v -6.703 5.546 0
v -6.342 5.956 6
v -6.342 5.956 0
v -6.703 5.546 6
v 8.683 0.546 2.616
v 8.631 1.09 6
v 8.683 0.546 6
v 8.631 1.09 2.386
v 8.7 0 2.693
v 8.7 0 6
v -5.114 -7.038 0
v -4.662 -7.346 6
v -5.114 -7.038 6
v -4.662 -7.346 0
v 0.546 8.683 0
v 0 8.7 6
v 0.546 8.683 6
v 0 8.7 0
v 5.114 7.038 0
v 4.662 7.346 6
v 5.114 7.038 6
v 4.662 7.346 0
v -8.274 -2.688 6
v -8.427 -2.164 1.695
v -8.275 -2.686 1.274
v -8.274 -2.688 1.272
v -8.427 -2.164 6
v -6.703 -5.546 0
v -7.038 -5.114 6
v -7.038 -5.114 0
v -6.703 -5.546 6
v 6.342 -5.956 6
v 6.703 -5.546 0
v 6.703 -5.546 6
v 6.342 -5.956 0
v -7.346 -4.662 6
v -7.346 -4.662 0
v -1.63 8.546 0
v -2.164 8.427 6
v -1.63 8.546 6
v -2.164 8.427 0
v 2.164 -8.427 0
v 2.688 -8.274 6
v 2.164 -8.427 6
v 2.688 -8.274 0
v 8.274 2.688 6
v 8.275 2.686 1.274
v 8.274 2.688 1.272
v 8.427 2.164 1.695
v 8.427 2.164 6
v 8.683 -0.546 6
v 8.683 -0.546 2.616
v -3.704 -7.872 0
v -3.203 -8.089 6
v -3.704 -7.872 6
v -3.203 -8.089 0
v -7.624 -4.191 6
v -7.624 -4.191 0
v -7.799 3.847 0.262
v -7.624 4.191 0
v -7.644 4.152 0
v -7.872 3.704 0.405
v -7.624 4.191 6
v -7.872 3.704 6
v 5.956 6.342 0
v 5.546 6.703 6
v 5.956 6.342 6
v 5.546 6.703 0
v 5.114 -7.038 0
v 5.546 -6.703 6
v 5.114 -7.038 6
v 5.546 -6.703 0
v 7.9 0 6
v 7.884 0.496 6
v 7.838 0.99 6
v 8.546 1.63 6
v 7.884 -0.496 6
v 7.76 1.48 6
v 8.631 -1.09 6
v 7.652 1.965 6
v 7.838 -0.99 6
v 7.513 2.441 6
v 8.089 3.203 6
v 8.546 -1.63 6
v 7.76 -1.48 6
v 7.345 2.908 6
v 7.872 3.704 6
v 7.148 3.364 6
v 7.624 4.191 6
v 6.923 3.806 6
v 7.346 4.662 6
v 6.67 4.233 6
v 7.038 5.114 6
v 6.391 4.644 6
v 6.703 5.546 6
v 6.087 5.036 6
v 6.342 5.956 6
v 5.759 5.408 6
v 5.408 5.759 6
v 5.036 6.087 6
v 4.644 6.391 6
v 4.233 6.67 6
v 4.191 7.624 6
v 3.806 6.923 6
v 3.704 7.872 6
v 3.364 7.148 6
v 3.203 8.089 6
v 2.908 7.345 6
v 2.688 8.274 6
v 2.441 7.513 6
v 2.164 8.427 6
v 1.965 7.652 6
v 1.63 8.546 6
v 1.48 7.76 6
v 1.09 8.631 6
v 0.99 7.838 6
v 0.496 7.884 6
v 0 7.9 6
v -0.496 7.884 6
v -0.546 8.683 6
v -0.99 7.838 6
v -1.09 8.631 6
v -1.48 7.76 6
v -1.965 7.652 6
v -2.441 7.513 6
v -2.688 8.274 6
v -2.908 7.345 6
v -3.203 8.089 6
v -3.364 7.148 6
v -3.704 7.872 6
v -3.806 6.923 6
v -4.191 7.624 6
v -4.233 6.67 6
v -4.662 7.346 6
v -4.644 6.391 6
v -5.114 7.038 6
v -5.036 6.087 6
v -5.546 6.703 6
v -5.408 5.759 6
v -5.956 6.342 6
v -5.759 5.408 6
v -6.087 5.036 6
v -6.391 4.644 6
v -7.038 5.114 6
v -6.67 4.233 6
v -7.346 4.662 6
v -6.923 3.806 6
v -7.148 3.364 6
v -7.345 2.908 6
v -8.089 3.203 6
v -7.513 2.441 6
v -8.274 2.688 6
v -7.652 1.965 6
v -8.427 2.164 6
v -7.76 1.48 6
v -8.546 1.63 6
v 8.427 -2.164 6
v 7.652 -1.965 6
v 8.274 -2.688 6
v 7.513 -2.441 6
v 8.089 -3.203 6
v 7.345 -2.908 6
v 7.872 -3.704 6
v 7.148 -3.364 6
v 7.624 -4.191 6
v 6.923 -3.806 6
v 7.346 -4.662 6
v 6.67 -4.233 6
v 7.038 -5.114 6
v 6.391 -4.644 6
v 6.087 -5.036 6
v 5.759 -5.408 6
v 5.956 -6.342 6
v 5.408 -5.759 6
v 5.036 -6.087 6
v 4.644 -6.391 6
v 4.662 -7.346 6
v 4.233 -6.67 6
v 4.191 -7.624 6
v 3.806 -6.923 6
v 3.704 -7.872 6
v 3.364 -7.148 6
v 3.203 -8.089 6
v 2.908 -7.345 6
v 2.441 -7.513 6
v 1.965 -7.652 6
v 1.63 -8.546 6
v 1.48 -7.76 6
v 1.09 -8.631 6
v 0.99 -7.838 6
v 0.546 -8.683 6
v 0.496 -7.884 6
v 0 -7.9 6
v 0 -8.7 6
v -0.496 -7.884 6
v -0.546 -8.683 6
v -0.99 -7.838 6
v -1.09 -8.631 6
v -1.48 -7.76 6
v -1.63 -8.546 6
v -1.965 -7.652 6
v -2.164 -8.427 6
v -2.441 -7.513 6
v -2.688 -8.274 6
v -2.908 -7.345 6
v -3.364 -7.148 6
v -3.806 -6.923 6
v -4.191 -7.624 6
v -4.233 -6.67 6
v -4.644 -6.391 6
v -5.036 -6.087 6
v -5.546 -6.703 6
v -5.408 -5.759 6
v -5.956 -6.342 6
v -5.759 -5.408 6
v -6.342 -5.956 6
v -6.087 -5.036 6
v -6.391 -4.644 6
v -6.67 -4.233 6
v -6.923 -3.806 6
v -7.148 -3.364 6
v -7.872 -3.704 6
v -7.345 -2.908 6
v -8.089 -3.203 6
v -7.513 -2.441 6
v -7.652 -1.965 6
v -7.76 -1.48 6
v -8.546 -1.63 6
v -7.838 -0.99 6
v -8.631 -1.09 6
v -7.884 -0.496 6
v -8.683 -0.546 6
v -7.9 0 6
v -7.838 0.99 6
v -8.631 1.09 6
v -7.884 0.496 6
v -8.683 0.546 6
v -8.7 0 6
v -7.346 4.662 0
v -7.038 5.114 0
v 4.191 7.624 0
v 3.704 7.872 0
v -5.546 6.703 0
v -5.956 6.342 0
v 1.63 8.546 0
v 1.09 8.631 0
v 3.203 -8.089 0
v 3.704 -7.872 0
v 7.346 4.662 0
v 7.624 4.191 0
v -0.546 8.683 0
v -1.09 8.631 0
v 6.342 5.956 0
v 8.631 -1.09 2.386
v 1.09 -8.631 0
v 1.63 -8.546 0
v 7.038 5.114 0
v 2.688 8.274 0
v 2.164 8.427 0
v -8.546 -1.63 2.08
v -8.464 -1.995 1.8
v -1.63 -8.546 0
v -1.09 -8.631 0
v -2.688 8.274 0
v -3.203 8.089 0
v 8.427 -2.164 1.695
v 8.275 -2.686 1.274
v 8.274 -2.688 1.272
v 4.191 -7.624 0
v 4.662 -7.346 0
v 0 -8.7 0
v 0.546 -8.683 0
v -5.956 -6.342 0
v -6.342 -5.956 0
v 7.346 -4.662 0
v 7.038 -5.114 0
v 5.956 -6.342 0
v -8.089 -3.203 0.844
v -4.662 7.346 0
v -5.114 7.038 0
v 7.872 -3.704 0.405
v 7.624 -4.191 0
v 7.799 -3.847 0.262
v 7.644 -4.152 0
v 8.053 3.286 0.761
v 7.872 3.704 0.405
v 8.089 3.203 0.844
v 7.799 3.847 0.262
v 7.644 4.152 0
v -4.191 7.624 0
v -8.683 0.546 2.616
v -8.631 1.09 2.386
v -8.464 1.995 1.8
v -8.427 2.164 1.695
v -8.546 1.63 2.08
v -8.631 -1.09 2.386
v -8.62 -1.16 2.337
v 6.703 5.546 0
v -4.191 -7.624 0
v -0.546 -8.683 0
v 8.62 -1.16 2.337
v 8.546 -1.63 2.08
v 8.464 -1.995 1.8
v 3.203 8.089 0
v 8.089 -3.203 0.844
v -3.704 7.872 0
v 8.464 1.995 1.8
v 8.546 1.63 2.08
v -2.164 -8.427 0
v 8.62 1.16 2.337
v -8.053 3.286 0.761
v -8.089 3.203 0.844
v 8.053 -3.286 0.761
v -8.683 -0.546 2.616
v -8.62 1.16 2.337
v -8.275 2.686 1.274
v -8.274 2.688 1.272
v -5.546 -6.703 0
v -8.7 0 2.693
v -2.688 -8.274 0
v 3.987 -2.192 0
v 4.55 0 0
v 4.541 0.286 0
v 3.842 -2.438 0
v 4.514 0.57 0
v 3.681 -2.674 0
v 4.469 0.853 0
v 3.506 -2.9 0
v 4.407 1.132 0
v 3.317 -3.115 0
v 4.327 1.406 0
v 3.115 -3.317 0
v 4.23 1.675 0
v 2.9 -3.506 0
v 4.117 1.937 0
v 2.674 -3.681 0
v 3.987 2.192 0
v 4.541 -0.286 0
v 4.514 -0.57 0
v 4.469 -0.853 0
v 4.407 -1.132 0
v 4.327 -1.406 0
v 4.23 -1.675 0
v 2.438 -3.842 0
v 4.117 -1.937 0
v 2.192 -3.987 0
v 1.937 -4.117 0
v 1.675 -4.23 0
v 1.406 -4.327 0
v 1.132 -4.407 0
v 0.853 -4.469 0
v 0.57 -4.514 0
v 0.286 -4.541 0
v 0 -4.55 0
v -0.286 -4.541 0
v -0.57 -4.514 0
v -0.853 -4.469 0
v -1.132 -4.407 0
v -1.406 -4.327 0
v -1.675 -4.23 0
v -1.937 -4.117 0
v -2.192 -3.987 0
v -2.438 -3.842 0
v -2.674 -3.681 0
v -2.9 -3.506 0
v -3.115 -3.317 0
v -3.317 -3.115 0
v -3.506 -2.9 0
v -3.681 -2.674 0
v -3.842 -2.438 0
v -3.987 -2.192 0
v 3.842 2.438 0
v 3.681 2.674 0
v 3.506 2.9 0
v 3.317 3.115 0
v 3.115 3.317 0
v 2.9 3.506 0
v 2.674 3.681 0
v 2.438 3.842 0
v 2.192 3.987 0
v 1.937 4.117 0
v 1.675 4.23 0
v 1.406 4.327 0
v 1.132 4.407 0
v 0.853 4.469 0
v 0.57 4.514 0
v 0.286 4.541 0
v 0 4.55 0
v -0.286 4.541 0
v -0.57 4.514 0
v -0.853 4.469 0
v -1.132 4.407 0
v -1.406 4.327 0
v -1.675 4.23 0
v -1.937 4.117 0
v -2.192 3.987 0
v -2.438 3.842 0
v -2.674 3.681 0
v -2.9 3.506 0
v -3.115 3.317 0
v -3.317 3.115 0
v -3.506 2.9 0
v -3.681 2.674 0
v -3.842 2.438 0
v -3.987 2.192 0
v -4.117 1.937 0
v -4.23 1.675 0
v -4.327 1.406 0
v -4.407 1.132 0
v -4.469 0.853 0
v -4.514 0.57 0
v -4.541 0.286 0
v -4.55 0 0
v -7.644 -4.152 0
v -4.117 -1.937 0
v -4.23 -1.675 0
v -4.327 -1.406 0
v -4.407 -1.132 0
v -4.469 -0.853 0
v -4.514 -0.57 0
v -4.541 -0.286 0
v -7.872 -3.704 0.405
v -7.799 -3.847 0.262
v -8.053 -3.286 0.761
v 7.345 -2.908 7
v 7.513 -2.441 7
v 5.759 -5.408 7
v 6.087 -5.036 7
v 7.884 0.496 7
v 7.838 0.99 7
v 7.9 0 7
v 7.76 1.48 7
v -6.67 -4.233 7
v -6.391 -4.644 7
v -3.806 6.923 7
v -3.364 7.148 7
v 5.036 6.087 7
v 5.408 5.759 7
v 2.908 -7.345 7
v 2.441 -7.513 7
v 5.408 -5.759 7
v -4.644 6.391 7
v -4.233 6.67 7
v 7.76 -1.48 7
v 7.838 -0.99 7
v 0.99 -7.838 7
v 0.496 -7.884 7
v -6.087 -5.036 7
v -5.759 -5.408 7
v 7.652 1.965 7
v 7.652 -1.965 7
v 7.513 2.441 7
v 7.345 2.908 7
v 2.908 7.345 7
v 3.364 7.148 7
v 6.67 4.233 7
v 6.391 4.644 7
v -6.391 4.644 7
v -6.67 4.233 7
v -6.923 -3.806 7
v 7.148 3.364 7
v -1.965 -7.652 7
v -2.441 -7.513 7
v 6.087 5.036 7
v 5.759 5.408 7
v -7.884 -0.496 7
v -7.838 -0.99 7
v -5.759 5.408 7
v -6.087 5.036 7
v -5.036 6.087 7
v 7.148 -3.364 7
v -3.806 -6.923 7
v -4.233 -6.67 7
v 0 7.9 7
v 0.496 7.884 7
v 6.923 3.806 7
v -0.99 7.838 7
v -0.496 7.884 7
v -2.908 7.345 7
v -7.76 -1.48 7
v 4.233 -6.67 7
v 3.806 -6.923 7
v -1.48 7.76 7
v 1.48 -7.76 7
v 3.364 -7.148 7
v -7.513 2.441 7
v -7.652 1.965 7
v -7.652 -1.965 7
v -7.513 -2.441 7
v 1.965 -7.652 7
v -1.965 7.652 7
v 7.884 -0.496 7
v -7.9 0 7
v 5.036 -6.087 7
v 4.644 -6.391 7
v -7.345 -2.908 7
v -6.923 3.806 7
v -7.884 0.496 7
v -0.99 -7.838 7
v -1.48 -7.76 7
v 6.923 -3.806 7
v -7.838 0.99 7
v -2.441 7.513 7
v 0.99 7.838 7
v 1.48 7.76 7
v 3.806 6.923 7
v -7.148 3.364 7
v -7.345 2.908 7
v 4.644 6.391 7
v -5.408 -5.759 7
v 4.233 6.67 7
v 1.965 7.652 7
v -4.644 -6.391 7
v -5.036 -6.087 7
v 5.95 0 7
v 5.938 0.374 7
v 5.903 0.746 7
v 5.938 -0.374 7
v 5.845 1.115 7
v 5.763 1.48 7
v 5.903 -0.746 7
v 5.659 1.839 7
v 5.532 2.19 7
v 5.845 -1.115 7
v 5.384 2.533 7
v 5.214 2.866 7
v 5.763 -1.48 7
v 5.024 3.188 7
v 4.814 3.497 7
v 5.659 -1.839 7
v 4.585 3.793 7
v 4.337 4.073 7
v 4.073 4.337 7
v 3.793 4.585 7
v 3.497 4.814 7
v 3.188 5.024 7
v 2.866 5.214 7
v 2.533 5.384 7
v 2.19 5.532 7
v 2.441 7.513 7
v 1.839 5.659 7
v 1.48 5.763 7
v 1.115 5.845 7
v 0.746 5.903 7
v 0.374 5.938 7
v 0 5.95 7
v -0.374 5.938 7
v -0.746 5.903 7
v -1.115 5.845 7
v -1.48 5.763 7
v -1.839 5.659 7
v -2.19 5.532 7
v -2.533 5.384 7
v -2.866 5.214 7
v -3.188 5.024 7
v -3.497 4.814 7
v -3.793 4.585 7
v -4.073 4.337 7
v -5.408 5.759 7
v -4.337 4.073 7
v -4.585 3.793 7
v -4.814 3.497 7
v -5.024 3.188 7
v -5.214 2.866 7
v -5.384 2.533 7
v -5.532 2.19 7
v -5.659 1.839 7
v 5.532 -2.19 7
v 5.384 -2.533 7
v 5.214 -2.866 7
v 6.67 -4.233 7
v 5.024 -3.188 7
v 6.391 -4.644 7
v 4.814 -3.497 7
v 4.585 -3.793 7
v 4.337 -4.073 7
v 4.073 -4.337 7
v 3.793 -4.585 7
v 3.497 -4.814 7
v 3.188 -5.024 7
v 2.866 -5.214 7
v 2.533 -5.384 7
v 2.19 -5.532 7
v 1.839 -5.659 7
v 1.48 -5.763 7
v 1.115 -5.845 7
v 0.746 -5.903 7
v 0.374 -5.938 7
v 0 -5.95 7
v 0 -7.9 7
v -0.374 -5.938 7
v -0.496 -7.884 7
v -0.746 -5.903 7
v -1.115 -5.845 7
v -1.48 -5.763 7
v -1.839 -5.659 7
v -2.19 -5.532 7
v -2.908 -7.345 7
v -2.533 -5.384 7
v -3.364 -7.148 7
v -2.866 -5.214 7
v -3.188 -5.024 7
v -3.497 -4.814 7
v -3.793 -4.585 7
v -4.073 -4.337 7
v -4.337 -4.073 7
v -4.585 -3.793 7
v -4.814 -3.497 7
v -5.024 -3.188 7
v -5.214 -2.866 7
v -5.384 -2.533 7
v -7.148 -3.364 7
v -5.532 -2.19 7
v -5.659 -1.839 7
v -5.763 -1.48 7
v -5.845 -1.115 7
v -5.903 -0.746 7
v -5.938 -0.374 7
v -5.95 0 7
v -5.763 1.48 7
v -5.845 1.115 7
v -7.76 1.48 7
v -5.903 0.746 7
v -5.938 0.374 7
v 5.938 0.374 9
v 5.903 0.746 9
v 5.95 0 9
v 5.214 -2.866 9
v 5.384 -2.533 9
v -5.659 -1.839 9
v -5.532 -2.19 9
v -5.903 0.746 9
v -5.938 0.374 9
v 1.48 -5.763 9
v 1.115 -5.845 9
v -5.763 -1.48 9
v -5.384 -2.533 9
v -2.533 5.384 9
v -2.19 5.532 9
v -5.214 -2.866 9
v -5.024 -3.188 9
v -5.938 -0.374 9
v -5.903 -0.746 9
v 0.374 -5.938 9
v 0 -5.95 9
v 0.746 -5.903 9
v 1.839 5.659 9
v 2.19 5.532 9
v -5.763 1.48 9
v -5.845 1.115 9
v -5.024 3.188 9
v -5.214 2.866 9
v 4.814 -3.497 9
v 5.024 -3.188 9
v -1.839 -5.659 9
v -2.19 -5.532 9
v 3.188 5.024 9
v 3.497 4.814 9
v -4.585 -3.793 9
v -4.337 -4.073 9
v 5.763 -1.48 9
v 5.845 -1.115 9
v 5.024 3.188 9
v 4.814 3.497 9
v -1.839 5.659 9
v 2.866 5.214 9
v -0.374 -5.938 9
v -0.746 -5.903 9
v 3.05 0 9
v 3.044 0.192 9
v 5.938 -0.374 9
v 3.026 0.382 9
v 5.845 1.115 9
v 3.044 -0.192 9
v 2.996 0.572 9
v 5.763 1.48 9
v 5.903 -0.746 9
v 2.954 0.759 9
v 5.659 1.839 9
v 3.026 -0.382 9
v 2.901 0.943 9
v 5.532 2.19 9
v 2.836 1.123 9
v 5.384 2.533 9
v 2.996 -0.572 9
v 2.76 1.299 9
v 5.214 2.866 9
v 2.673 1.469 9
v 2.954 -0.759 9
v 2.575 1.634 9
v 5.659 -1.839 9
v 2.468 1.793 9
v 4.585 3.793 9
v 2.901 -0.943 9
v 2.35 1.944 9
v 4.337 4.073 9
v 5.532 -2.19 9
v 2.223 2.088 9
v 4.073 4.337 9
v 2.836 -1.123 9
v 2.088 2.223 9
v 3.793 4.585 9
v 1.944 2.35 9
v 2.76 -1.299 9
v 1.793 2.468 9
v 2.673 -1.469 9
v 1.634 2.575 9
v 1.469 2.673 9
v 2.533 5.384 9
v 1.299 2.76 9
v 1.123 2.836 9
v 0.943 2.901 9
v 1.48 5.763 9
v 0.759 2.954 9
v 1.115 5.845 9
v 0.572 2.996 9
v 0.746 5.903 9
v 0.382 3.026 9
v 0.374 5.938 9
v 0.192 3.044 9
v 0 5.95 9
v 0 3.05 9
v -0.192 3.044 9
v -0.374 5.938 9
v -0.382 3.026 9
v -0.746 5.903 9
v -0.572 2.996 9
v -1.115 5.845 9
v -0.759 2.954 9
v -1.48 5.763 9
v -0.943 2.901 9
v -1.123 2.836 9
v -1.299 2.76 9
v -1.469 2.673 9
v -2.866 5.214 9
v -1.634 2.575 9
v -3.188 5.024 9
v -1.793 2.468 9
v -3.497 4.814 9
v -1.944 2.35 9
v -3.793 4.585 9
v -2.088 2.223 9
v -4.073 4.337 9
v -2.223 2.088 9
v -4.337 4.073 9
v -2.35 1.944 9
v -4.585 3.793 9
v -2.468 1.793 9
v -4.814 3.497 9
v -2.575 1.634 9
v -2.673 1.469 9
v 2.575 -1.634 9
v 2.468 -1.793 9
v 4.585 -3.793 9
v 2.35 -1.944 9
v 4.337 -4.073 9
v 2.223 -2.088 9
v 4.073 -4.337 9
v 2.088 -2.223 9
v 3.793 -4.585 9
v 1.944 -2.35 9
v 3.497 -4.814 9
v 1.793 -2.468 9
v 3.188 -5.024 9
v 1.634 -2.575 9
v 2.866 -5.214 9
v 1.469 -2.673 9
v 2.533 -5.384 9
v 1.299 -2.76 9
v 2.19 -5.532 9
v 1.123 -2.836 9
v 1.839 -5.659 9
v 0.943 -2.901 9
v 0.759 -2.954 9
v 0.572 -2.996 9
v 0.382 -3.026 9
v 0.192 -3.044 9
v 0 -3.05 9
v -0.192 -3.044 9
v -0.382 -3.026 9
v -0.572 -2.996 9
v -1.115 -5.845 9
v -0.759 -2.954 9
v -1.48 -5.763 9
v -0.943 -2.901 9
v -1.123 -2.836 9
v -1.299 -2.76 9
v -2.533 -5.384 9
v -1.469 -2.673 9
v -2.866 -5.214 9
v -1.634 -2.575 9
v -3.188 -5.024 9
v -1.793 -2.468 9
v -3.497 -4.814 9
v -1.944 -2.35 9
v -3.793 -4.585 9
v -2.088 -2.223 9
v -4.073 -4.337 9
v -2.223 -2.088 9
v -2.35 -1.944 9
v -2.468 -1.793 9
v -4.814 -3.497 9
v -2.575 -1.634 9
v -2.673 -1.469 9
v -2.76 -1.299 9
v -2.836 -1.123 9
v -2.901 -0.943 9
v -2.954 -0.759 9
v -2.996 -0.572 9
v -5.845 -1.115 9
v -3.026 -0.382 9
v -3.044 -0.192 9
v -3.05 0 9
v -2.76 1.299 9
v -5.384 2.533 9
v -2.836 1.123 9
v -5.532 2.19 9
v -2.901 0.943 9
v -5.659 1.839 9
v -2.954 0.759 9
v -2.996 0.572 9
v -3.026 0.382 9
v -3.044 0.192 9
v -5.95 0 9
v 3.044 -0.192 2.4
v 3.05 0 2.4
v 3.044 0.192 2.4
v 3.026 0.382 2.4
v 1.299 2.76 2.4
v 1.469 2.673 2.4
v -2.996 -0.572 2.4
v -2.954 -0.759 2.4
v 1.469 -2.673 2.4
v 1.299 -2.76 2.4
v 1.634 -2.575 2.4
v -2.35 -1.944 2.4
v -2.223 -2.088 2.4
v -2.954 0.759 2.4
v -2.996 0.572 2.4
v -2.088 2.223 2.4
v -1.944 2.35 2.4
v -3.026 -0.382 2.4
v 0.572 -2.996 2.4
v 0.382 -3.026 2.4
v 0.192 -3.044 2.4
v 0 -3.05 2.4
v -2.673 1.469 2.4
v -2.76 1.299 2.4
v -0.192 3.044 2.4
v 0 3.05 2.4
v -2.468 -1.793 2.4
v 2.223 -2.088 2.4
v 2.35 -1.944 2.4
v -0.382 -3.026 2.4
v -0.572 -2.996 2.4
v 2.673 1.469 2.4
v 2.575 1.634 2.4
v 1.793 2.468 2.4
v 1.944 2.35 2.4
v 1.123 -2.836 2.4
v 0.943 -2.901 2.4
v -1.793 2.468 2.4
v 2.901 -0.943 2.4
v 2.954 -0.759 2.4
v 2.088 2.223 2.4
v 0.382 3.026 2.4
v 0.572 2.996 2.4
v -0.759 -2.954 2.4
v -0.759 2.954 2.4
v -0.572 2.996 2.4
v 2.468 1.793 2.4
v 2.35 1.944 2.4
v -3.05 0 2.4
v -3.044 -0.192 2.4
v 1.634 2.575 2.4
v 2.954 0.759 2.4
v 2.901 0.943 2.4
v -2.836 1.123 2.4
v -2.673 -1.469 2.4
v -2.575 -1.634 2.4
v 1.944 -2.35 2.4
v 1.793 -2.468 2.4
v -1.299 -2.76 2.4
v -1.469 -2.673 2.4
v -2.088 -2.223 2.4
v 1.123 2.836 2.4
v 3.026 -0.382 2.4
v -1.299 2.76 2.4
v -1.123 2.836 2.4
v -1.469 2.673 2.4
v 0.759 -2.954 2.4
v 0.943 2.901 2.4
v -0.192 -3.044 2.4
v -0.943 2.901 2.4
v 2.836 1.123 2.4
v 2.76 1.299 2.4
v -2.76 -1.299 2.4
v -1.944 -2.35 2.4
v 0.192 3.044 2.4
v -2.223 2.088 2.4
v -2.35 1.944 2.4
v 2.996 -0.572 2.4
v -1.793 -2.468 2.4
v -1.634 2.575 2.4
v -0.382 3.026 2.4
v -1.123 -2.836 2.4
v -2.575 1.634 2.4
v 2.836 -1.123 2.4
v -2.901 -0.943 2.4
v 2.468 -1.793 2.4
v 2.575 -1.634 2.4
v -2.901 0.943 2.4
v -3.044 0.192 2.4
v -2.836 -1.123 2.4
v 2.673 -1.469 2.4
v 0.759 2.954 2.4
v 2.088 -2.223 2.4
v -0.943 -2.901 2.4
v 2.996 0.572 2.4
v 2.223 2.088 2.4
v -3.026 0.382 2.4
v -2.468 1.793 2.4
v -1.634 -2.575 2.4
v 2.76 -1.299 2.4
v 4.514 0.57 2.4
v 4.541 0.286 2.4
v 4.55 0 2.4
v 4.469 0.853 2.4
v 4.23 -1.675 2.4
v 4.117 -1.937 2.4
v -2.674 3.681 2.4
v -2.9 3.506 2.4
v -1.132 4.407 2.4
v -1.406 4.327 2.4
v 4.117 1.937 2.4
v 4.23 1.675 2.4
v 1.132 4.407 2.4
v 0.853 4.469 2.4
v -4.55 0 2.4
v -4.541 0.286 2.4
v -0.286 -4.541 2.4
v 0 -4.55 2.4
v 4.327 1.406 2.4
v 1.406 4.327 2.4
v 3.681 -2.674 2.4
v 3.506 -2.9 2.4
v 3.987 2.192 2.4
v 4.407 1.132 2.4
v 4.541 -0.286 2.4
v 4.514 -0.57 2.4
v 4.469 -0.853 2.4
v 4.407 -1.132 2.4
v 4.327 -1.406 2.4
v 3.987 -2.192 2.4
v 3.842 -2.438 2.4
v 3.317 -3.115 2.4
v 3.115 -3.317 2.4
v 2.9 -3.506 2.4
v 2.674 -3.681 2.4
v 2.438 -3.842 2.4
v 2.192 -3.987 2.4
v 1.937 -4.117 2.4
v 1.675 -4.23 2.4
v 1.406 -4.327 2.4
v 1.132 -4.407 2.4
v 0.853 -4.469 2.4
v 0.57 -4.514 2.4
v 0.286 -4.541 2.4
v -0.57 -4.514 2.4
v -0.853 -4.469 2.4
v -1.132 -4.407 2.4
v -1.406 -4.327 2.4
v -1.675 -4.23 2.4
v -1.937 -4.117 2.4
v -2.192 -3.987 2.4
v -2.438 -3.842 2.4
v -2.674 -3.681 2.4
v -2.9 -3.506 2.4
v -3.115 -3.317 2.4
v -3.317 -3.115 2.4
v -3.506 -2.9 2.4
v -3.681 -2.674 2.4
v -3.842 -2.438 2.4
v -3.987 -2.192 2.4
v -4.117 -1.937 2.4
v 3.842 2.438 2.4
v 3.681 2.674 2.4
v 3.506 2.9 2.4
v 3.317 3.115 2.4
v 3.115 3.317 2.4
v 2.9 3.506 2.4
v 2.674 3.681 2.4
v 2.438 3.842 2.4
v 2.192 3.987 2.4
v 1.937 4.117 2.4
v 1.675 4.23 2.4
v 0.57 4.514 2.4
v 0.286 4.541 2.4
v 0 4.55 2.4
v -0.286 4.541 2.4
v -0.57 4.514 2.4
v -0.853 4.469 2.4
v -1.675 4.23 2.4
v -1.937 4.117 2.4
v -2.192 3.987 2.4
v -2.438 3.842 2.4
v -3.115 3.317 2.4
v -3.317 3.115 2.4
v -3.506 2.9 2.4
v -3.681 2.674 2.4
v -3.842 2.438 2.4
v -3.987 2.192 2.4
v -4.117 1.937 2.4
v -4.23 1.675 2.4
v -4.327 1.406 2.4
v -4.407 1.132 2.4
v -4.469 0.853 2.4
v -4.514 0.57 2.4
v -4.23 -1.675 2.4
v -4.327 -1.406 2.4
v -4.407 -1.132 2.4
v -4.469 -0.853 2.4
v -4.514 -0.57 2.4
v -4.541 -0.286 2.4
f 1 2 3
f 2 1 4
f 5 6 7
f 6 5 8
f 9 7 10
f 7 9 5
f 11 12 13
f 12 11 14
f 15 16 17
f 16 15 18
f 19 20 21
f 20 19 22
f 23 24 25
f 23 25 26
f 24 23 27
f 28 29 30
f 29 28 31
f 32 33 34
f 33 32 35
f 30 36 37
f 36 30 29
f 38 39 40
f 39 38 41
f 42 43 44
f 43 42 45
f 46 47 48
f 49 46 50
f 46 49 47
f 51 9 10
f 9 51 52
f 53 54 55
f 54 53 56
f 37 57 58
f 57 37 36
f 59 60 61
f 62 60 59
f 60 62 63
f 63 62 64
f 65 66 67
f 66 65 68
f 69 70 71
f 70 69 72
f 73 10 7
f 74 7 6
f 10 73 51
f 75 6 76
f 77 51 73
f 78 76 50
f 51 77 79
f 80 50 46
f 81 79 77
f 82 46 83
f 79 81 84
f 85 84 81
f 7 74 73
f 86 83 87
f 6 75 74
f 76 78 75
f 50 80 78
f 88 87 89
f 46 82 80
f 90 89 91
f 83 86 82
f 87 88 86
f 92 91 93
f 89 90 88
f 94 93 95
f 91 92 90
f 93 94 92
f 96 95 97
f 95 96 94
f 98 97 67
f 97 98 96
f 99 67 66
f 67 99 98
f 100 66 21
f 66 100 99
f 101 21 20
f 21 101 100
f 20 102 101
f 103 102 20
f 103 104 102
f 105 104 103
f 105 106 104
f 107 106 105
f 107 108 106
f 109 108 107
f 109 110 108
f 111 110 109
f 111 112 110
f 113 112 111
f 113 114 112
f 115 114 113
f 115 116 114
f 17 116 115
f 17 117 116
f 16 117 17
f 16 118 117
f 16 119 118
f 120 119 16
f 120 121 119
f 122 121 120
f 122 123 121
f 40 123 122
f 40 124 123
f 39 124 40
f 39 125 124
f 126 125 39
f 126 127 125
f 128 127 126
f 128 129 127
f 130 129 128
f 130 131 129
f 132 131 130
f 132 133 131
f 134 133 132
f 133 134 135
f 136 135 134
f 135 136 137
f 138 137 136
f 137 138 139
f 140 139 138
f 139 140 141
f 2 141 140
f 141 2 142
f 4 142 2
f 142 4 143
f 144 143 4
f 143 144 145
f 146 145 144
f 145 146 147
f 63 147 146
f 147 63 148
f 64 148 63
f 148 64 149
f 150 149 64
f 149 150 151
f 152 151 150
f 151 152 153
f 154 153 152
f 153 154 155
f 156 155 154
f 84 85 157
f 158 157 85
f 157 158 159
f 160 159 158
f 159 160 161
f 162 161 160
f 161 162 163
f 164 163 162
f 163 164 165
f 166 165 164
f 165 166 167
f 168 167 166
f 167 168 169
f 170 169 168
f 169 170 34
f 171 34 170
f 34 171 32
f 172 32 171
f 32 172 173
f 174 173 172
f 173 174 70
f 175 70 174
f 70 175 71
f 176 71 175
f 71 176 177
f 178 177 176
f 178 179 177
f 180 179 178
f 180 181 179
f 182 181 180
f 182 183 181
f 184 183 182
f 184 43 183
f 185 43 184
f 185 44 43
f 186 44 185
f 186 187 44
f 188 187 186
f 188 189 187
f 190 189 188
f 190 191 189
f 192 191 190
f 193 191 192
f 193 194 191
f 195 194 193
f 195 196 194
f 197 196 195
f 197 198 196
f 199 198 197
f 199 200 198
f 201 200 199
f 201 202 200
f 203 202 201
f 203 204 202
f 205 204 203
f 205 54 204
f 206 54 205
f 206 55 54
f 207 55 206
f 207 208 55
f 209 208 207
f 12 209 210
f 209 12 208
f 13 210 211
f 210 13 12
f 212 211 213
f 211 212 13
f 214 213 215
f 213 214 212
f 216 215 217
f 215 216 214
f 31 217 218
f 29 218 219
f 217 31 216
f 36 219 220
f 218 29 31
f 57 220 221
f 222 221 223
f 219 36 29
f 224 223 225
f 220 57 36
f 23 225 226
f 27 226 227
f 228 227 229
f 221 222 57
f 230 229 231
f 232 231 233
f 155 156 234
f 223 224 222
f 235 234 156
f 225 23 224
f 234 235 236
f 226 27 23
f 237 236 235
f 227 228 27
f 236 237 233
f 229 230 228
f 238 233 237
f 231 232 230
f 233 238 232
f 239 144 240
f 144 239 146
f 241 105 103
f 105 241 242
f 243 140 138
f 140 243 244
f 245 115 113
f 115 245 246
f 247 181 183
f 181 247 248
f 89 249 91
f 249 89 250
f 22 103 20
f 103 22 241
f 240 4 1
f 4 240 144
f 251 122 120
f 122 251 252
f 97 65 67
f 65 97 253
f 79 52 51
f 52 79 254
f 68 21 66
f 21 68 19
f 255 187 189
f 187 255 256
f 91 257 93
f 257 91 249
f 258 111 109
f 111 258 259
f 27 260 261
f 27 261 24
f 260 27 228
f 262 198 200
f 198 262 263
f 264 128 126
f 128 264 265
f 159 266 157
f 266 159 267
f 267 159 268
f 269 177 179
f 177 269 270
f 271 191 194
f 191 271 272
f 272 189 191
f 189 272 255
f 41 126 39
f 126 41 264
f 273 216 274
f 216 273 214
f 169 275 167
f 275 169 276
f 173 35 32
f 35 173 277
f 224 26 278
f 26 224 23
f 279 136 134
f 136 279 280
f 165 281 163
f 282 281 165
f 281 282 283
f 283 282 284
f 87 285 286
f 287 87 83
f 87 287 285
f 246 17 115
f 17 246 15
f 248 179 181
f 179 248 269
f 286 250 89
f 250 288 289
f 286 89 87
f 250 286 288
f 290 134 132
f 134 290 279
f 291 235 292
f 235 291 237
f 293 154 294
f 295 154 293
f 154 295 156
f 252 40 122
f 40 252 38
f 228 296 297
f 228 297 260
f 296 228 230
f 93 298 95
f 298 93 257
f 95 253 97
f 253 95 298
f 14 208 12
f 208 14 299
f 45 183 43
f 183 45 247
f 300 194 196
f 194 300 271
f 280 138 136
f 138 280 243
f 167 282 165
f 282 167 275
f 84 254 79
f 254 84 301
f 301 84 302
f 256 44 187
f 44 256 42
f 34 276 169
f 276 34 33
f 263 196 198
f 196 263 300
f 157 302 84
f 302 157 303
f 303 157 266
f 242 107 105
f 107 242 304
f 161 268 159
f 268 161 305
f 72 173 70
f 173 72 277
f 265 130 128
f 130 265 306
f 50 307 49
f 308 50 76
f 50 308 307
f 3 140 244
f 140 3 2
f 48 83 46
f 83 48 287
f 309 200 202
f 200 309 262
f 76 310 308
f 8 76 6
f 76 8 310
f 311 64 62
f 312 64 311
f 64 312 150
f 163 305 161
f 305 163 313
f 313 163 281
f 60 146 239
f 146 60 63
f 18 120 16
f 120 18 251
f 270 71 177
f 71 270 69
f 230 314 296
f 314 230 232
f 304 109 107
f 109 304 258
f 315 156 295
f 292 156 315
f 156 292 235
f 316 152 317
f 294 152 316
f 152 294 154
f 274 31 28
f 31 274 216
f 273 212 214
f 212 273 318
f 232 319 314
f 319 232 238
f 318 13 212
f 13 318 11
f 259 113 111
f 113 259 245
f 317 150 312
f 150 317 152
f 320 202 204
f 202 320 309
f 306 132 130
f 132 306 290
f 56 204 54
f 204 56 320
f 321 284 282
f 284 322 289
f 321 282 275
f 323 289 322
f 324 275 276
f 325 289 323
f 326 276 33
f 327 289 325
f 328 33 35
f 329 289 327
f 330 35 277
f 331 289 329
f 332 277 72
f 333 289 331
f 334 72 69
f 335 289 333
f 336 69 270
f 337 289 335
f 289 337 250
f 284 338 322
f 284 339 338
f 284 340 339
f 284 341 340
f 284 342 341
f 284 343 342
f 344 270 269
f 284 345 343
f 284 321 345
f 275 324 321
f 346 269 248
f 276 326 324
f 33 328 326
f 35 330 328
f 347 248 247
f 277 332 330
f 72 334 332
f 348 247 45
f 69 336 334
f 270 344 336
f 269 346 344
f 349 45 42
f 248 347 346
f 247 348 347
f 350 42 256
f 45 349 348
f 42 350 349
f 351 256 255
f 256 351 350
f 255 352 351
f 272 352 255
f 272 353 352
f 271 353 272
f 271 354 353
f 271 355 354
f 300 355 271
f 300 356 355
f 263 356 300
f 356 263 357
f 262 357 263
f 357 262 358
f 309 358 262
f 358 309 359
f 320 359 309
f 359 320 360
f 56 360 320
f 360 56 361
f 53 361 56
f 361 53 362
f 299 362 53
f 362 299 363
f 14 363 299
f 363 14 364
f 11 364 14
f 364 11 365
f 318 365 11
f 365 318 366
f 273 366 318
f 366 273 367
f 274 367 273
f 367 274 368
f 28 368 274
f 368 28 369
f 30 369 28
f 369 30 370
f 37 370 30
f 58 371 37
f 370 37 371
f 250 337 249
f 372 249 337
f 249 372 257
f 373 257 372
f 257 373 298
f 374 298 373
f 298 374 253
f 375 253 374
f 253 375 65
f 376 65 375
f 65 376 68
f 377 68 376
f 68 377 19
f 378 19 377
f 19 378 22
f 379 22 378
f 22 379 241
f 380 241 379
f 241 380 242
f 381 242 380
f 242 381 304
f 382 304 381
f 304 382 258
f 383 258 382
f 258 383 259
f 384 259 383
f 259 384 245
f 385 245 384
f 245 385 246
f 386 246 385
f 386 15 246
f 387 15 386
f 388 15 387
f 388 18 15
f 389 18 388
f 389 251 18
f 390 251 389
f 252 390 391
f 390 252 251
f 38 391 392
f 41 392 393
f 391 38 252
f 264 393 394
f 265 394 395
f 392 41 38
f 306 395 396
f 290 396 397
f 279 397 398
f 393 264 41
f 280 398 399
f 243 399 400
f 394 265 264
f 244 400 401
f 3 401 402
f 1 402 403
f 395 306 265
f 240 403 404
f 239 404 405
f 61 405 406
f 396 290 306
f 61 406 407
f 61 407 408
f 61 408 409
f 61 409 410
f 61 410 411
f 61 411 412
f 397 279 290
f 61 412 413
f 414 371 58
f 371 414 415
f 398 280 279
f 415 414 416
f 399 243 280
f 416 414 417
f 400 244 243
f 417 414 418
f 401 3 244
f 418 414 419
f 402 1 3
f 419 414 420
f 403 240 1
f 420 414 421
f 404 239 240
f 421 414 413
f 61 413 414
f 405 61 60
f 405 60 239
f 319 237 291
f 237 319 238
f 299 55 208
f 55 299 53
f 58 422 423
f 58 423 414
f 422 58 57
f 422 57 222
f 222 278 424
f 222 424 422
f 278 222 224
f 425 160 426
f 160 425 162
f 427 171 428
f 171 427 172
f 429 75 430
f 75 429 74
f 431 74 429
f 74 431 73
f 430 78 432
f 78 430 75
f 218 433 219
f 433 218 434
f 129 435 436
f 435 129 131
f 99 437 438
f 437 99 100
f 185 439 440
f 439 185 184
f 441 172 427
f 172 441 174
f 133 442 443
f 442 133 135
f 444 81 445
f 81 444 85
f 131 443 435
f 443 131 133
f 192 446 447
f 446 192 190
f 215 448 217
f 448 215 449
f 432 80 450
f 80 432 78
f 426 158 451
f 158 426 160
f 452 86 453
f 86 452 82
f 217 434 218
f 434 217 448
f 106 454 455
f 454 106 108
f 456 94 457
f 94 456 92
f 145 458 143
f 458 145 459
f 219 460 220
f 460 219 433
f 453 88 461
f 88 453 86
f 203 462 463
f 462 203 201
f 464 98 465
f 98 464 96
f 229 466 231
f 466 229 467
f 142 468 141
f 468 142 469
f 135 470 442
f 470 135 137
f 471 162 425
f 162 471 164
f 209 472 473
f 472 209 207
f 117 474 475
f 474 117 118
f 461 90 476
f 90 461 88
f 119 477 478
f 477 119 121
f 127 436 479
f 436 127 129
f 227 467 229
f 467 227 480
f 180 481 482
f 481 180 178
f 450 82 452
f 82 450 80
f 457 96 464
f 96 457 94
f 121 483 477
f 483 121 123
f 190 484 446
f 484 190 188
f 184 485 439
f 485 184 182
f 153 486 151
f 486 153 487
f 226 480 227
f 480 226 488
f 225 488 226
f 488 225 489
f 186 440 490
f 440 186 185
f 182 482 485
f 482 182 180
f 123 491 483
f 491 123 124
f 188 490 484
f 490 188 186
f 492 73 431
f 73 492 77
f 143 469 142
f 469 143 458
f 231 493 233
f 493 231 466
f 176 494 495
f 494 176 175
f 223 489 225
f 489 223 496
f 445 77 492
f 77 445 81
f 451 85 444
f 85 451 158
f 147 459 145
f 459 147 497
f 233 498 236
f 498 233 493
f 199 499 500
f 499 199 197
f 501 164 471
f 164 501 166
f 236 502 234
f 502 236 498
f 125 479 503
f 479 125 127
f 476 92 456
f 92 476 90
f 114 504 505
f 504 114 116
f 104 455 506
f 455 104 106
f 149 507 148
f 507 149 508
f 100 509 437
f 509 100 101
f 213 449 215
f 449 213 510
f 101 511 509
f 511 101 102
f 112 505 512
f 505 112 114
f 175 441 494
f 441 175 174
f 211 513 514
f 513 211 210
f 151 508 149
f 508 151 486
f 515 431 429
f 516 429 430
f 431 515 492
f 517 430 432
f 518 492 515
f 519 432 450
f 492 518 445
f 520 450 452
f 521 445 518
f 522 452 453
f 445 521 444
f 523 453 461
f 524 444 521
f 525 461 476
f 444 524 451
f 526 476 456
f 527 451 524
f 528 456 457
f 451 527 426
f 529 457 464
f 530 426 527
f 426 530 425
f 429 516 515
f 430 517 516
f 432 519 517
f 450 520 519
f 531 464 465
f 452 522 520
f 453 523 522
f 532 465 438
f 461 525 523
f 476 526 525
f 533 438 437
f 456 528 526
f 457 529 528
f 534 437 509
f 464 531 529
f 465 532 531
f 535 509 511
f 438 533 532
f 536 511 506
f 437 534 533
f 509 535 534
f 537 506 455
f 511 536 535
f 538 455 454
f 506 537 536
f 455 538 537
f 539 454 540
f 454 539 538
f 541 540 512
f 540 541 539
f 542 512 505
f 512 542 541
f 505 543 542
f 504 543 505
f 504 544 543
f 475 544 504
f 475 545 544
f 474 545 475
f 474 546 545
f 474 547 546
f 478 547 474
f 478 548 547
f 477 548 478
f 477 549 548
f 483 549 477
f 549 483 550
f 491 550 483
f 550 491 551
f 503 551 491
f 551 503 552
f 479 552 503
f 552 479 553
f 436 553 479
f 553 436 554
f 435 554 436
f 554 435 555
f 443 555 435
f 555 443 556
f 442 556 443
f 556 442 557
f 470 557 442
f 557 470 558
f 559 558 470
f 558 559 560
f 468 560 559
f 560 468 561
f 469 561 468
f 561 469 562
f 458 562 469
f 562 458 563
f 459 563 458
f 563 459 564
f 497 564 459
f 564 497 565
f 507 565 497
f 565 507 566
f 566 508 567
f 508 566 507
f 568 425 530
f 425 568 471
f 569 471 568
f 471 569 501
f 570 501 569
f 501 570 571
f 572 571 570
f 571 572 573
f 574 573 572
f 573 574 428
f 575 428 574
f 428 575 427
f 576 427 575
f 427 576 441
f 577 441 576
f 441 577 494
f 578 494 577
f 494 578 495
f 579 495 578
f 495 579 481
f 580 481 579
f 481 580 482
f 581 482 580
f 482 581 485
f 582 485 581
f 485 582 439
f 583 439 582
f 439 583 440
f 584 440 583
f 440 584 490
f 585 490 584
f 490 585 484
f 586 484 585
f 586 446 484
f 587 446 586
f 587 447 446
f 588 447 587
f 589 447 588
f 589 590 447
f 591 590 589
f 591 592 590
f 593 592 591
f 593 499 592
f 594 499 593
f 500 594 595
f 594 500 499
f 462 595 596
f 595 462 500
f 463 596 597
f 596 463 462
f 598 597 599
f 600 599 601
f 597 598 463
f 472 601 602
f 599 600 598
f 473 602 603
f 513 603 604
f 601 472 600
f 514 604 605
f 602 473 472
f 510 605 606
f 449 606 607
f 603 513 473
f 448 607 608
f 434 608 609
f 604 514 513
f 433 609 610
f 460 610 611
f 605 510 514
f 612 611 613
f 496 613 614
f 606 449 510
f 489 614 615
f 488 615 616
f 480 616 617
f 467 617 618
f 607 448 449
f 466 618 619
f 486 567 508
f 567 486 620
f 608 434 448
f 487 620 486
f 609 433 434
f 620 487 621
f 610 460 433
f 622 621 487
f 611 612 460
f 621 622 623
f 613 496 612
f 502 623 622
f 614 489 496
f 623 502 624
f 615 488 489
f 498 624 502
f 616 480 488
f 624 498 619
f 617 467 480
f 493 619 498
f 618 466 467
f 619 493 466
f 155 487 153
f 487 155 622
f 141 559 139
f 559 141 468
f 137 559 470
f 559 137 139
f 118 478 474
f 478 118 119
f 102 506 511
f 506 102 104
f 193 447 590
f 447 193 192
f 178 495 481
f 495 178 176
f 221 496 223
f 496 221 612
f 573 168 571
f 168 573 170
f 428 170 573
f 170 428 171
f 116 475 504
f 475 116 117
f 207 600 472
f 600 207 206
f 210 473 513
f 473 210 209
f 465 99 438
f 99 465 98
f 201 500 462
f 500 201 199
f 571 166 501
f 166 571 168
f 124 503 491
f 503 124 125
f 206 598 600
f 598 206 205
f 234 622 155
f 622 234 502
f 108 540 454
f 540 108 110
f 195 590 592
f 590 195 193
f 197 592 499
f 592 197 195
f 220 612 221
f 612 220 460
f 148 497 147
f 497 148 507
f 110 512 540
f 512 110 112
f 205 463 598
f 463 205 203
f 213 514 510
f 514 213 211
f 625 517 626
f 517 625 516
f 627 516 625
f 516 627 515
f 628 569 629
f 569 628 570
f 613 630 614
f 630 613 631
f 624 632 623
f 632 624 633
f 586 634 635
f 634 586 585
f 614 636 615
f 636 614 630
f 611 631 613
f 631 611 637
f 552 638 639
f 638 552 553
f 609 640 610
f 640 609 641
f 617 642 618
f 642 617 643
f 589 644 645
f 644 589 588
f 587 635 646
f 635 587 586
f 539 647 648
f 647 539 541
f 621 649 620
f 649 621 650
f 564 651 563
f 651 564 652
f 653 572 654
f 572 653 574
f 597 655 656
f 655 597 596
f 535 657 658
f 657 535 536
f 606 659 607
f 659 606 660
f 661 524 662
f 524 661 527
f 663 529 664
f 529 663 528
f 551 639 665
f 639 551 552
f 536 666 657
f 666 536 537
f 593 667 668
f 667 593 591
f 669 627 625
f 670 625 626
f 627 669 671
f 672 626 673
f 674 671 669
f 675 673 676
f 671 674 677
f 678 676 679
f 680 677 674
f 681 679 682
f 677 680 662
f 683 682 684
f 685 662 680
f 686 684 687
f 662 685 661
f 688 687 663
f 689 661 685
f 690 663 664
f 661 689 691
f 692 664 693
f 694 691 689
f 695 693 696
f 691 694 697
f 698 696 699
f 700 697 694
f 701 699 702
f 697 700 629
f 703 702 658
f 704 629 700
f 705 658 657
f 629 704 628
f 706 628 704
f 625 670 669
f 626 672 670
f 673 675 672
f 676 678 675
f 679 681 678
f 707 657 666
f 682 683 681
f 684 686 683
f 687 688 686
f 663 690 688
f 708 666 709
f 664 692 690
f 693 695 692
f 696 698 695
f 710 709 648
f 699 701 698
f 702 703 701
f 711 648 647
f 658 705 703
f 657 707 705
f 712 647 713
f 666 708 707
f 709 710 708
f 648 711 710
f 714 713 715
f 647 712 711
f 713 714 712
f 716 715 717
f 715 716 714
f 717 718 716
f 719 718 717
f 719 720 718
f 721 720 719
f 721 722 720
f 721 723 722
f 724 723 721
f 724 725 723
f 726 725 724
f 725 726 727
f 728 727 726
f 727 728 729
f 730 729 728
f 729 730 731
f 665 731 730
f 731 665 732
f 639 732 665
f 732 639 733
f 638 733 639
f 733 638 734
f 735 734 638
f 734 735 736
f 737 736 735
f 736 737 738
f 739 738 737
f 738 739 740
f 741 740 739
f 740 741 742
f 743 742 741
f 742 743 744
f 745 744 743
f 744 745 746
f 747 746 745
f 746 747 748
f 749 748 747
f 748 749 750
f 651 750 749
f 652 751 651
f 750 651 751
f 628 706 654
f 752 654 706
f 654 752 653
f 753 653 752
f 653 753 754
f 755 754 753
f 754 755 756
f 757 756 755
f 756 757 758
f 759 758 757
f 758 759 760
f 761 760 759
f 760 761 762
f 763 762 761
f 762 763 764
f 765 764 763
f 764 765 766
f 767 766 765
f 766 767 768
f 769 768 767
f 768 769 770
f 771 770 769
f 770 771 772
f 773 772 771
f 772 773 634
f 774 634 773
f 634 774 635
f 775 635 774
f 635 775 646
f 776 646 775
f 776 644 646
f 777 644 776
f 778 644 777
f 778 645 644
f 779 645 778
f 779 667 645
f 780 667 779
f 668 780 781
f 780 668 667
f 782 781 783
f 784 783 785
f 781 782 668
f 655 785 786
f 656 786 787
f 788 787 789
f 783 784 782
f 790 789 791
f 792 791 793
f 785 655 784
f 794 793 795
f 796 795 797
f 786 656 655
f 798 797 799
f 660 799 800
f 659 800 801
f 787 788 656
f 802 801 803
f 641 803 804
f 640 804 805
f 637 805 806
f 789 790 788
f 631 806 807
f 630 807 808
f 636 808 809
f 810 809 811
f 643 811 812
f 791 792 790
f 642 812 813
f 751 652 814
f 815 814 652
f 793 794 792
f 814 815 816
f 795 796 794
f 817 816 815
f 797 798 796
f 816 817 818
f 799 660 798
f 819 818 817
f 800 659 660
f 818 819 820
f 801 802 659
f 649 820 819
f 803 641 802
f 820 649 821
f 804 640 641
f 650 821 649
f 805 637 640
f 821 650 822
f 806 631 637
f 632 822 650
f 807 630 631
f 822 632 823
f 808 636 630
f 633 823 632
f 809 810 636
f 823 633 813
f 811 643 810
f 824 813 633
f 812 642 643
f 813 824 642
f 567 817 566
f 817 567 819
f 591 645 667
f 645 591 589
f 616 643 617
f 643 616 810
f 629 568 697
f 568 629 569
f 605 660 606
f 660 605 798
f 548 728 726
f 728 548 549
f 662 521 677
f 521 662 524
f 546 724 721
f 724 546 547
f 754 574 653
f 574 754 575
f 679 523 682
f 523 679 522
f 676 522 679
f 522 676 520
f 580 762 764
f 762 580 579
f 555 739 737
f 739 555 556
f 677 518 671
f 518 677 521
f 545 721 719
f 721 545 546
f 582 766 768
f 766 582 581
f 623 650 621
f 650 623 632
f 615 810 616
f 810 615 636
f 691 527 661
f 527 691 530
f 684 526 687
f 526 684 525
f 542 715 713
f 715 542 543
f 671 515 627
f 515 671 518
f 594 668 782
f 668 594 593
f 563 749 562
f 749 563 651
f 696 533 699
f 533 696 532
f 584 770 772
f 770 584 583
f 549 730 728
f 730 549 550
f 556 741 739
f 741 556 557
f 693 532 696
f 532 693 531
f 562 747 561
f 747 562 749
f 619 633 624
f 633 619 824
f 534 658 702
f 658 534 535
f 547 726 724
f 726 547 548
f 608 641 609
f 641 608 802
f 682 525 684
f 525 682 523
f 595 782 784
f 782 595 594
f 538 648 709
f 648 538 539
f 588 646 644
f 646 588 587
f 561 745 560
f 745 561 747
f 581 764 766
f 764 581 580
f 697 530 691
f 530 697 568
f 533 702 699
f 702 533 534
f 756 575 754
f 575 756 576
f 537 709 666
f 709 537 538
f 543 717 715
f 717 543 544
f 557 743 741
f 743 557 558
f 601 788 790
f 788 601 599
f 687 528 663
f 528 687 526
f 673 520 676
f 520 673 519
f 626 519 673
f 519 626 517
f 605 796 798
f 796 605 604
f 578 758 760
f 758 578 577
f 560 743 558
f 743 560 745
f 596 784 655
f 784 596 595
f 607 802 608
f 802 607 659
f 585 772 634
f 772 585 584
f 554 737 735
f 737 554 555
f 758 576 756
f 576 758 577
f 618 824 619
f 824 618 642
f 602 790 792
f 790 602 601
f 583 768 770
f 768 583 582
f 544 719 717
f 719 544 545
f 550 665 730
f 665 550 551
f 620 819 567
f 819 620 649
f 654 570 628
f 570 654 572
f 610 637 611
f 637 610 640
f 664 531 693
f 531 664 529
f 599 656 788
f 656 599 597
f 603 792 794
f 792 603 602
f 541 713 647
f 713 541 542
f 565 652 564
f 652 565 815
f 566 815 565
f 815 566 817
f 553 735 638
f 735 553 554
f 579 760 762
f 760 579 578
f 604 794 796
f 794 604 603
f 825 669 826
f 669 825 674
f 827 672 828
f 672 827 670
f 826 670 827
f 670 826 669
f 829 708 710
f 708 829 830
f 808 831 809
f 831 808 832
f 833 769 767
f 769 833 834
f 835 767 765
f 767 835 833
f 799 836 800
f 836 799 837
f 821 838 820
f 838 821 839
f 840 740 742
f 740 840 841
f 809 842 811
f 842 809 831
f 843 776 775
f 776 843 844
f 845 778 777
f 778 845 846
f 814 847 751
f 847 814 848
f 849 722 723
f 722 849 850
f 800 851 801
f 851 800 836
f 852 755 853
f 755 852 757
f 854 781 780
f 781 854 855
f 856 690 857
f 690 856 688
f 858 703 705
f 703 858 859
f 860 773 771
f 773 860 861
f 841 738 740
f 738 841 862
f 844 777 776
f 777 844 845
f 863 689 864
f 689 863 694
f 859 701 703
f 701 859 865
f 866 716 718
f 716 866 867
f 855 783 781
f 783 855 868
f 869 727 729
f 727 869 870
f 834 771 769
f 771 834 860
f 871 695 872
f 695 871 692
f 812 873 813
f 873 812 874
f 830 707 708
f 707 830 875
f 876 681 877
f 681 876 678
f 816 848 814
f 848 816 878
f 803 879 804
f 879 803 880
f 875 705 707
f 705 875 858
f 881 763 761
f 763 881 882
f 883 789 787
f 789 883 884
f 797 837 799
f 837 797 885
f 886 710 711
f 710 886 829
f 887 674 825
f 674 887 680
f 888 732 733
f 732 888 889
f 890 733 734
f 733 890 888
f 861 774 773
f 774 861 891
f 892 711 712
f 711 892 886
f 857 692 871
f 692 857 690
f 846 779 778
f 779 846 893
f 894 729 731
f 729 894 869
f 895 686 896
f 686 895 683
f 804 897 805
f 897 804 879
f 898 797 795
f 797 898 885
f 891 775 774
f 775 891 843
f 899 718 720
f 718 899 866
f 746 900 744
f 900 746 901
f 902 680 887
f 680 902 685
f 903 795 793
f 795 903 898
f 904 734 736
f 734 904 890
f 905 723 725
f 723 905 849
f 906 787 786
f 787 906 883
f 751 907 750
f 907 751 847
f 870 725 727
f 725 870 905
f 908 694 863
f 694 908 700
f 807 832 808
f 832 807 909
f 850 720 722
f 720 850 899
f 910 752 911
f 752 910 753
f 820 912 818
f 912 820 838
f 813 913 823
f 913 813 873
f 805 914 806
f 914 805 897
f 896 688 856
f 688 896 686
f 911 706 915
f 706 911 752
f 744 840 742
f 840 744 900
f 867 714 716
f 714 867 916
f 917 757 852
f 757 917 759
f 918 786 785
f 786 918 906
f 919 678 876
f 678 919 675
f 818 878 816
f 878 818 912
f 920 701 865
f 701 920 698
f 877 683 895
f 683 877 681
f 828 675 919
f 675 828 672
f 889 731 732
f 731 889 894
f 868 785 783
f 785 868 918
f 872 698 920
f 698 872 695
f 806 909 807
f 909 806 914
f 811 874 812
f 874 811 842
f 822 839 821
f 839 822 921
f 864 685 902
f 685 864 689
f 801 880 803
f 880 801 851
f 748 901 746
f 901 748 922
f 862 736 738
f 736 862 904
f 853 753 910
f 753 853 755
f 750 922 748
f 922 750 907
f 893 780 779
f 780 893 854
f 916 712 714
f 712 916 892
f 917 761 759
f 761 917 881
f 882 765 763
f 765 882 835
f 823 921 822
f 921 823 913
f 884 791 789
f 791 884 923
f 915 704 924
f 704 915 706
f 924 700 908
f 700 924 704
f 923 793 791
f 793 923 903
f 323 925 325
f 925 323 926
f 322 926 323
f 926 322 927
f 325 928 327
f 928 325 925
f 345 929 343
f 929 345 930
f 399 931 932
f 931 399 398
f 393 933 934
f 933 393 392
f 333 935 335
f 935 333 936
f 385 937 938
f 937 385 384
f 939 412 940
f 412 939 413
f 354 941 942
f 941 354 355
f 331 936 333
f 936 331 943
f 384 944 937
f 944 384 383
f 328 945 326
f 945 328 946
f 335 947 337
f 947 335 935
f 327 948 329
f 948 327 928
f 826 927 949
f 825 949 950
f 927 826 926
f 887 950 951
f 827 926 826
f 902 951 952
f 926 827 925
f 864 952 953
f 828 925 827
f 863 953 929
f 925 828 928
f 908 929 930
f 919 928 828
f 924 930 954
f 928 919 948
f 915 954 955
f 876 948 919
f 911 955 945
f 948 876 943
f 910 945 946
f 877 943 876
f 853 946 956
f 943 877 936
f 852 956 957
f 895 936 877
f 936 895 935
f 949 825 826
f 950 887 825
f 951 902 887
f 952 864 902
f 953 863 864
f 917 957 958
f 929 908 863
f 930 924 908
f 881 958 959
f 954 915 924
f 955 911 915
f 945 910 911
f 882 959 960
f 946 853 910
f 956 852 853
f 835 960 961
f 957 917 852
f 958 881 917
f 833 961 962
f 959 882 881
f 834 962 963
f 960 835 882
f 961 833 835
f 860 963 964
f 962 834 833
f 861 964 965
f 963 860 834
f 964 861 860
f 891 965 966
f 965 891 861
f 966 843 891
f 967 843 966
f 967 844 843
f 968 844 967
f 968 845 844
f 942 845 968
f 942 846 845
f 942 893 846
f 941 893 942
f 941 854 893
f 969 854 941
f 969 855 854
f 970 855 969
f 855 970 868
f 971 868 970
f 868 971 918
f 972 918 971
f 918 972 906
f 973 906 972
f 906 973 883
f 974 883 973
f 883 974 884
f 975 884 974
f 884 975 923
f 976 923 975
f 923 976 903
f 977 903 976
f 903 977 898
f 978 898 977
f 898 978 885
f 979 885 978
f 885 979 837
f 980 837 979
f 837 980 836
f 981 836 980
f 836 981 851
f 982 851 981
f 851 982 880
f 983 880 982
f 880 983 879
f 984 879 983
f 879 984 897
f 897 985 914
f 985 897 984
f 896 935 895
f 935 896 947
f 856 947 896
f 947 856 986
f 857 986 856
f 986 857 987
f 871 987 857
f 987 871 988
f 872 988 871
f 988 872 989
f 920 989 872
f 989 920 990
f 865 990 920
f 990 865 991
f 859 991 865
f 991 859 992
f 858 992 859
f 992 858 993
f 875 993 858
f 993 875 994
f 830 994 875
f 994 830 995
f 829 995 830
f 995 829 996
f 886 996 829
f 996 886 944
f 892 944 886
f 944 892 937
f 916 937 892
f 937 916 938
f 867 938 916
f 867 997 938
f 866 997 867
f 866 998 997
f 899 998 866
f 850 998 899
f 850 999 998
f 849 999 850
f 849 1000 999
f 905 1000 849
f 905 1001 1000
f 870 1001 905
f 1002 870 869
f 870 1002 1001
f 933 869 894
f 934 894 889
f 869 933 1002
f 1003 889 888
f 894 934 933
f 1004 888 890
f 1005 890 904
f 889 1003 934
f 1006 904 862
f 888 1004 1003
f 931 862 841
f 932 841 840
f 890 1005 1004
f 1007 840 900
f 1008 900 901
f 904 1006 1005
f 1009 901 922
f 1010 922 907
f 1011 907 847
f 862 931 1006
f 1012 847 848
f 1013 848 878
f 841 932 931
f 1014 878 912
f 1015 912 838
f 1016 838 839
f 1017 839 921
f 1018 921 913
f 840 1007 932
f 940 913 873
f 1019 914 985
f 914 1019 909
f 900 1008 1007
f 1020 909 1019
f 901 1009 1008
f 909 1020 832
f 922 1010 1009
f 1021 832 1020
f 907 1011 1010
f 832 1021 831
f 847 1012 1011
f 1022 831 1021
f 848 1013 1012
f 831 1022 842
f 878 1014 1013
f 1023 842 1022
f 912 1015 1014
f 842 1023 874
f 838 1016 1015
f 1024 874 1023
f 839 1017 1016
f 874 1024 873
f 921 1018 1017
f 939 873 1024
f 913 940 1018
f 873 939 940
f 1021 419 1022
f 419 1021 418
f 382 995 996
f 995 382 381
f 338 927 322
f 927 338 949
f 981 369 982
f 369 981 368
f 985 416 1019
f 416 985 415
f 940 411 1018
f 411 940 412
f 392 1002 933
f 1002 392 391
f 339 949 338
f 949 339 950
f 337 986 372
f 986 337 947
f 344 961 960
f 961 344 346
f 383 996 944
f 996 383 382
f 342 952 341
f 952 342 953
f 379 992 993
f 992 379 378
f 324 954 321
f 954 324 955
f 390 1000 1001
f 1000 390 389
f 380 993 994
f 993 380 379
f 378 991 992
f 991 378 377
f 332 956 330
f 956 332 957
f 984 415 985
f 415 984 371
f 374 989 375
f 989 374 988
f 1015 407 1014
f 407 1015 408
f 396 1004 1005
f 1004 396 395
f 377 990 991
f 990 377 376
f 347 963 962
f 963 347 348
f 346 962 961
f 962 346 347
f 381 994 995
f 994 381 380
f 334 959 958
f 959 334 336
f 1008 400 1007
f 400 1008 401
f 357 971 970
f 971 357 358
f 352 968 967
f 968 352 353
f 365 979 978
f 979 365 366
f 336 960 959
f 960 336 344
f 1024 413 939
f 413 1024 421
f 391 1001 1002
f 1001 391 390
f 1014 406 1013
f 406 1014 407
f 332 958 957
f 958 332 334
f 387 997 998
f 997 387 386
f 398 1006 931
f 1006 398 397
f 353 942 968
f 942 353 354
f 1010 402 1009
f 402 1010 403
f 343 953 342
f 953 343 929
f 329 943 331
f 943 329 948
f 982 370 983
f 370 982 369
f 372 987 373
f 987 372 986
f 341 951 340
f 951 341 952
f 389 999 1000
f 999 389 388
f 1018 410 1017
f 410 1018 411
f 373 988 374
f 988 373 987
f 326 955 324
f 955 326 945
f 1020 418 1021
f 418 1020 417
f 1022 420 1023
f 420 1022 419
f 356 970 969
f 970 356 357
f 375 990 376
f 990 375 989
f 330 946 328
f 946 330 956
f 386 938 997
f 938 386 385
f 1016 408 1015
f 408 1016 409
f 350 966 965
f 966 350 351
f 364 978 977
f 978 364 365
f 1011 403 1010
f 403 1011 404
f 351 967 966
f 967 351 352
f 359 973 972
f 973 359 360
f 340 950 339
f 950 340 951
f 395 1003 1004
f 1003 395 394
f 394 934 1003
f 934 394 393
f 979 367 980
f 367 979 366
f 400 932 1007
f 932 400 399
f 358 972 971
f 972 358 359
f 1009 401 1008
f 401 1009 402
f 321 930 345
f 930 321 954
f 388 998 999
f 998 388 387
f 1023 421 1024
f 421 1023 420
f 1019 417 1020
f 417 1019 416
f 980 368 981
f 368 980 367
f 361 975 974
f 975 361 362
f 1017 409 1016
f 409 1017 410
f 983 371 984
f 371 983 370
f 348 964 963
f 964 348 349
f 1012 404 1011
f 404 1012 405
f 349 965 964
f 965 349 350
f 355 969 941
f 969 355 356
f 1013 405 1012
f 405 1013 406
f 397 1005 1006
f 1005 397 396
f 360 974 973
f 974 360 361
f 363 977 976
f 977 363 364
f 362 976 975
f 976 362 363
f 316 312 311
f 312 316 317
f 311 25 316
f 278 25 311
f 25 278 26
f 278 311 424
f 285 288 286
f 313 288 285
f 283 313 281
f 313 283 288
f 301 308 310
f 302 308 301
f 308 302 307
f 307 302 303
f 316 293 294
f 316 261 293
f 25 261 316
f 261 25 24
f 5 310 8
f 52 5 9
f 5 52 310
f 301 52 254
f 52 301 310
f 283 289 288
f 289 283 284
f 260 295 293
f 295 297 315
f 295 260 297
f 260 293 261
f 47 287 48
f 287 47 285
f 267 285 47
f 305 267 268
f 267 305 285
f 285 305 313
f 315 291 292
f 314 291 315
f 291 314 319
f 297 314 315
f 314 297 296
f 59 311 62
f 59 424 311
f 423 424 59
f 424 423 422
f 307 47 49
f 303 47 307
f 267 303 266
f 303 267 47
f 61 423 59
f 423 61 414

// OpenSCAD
$fn=100;

ovHght=9.1;
fudge=0.1;

intersection(){
  difference(){
    union(){
      cylinder(d=17.4,h=6);
      translate([0,0,6]) cylinder(d=15.8,h=1);
      translate([0,0,ovHght-2.1]) cylinder(d=11.9,h=2);
    }
    translate([0,0,-fudge/2]) cylinder(d=6.1,h=ovHght+fudge);
    translate([0,0,-fudge]) cylinder(d=9.1,h=ovHght-6.6);
  }
  translate([0,0,ovHght/2]) rotate([90,0,0]) cylinder(d=17.8,h=ovHght*2,center=true);
}
